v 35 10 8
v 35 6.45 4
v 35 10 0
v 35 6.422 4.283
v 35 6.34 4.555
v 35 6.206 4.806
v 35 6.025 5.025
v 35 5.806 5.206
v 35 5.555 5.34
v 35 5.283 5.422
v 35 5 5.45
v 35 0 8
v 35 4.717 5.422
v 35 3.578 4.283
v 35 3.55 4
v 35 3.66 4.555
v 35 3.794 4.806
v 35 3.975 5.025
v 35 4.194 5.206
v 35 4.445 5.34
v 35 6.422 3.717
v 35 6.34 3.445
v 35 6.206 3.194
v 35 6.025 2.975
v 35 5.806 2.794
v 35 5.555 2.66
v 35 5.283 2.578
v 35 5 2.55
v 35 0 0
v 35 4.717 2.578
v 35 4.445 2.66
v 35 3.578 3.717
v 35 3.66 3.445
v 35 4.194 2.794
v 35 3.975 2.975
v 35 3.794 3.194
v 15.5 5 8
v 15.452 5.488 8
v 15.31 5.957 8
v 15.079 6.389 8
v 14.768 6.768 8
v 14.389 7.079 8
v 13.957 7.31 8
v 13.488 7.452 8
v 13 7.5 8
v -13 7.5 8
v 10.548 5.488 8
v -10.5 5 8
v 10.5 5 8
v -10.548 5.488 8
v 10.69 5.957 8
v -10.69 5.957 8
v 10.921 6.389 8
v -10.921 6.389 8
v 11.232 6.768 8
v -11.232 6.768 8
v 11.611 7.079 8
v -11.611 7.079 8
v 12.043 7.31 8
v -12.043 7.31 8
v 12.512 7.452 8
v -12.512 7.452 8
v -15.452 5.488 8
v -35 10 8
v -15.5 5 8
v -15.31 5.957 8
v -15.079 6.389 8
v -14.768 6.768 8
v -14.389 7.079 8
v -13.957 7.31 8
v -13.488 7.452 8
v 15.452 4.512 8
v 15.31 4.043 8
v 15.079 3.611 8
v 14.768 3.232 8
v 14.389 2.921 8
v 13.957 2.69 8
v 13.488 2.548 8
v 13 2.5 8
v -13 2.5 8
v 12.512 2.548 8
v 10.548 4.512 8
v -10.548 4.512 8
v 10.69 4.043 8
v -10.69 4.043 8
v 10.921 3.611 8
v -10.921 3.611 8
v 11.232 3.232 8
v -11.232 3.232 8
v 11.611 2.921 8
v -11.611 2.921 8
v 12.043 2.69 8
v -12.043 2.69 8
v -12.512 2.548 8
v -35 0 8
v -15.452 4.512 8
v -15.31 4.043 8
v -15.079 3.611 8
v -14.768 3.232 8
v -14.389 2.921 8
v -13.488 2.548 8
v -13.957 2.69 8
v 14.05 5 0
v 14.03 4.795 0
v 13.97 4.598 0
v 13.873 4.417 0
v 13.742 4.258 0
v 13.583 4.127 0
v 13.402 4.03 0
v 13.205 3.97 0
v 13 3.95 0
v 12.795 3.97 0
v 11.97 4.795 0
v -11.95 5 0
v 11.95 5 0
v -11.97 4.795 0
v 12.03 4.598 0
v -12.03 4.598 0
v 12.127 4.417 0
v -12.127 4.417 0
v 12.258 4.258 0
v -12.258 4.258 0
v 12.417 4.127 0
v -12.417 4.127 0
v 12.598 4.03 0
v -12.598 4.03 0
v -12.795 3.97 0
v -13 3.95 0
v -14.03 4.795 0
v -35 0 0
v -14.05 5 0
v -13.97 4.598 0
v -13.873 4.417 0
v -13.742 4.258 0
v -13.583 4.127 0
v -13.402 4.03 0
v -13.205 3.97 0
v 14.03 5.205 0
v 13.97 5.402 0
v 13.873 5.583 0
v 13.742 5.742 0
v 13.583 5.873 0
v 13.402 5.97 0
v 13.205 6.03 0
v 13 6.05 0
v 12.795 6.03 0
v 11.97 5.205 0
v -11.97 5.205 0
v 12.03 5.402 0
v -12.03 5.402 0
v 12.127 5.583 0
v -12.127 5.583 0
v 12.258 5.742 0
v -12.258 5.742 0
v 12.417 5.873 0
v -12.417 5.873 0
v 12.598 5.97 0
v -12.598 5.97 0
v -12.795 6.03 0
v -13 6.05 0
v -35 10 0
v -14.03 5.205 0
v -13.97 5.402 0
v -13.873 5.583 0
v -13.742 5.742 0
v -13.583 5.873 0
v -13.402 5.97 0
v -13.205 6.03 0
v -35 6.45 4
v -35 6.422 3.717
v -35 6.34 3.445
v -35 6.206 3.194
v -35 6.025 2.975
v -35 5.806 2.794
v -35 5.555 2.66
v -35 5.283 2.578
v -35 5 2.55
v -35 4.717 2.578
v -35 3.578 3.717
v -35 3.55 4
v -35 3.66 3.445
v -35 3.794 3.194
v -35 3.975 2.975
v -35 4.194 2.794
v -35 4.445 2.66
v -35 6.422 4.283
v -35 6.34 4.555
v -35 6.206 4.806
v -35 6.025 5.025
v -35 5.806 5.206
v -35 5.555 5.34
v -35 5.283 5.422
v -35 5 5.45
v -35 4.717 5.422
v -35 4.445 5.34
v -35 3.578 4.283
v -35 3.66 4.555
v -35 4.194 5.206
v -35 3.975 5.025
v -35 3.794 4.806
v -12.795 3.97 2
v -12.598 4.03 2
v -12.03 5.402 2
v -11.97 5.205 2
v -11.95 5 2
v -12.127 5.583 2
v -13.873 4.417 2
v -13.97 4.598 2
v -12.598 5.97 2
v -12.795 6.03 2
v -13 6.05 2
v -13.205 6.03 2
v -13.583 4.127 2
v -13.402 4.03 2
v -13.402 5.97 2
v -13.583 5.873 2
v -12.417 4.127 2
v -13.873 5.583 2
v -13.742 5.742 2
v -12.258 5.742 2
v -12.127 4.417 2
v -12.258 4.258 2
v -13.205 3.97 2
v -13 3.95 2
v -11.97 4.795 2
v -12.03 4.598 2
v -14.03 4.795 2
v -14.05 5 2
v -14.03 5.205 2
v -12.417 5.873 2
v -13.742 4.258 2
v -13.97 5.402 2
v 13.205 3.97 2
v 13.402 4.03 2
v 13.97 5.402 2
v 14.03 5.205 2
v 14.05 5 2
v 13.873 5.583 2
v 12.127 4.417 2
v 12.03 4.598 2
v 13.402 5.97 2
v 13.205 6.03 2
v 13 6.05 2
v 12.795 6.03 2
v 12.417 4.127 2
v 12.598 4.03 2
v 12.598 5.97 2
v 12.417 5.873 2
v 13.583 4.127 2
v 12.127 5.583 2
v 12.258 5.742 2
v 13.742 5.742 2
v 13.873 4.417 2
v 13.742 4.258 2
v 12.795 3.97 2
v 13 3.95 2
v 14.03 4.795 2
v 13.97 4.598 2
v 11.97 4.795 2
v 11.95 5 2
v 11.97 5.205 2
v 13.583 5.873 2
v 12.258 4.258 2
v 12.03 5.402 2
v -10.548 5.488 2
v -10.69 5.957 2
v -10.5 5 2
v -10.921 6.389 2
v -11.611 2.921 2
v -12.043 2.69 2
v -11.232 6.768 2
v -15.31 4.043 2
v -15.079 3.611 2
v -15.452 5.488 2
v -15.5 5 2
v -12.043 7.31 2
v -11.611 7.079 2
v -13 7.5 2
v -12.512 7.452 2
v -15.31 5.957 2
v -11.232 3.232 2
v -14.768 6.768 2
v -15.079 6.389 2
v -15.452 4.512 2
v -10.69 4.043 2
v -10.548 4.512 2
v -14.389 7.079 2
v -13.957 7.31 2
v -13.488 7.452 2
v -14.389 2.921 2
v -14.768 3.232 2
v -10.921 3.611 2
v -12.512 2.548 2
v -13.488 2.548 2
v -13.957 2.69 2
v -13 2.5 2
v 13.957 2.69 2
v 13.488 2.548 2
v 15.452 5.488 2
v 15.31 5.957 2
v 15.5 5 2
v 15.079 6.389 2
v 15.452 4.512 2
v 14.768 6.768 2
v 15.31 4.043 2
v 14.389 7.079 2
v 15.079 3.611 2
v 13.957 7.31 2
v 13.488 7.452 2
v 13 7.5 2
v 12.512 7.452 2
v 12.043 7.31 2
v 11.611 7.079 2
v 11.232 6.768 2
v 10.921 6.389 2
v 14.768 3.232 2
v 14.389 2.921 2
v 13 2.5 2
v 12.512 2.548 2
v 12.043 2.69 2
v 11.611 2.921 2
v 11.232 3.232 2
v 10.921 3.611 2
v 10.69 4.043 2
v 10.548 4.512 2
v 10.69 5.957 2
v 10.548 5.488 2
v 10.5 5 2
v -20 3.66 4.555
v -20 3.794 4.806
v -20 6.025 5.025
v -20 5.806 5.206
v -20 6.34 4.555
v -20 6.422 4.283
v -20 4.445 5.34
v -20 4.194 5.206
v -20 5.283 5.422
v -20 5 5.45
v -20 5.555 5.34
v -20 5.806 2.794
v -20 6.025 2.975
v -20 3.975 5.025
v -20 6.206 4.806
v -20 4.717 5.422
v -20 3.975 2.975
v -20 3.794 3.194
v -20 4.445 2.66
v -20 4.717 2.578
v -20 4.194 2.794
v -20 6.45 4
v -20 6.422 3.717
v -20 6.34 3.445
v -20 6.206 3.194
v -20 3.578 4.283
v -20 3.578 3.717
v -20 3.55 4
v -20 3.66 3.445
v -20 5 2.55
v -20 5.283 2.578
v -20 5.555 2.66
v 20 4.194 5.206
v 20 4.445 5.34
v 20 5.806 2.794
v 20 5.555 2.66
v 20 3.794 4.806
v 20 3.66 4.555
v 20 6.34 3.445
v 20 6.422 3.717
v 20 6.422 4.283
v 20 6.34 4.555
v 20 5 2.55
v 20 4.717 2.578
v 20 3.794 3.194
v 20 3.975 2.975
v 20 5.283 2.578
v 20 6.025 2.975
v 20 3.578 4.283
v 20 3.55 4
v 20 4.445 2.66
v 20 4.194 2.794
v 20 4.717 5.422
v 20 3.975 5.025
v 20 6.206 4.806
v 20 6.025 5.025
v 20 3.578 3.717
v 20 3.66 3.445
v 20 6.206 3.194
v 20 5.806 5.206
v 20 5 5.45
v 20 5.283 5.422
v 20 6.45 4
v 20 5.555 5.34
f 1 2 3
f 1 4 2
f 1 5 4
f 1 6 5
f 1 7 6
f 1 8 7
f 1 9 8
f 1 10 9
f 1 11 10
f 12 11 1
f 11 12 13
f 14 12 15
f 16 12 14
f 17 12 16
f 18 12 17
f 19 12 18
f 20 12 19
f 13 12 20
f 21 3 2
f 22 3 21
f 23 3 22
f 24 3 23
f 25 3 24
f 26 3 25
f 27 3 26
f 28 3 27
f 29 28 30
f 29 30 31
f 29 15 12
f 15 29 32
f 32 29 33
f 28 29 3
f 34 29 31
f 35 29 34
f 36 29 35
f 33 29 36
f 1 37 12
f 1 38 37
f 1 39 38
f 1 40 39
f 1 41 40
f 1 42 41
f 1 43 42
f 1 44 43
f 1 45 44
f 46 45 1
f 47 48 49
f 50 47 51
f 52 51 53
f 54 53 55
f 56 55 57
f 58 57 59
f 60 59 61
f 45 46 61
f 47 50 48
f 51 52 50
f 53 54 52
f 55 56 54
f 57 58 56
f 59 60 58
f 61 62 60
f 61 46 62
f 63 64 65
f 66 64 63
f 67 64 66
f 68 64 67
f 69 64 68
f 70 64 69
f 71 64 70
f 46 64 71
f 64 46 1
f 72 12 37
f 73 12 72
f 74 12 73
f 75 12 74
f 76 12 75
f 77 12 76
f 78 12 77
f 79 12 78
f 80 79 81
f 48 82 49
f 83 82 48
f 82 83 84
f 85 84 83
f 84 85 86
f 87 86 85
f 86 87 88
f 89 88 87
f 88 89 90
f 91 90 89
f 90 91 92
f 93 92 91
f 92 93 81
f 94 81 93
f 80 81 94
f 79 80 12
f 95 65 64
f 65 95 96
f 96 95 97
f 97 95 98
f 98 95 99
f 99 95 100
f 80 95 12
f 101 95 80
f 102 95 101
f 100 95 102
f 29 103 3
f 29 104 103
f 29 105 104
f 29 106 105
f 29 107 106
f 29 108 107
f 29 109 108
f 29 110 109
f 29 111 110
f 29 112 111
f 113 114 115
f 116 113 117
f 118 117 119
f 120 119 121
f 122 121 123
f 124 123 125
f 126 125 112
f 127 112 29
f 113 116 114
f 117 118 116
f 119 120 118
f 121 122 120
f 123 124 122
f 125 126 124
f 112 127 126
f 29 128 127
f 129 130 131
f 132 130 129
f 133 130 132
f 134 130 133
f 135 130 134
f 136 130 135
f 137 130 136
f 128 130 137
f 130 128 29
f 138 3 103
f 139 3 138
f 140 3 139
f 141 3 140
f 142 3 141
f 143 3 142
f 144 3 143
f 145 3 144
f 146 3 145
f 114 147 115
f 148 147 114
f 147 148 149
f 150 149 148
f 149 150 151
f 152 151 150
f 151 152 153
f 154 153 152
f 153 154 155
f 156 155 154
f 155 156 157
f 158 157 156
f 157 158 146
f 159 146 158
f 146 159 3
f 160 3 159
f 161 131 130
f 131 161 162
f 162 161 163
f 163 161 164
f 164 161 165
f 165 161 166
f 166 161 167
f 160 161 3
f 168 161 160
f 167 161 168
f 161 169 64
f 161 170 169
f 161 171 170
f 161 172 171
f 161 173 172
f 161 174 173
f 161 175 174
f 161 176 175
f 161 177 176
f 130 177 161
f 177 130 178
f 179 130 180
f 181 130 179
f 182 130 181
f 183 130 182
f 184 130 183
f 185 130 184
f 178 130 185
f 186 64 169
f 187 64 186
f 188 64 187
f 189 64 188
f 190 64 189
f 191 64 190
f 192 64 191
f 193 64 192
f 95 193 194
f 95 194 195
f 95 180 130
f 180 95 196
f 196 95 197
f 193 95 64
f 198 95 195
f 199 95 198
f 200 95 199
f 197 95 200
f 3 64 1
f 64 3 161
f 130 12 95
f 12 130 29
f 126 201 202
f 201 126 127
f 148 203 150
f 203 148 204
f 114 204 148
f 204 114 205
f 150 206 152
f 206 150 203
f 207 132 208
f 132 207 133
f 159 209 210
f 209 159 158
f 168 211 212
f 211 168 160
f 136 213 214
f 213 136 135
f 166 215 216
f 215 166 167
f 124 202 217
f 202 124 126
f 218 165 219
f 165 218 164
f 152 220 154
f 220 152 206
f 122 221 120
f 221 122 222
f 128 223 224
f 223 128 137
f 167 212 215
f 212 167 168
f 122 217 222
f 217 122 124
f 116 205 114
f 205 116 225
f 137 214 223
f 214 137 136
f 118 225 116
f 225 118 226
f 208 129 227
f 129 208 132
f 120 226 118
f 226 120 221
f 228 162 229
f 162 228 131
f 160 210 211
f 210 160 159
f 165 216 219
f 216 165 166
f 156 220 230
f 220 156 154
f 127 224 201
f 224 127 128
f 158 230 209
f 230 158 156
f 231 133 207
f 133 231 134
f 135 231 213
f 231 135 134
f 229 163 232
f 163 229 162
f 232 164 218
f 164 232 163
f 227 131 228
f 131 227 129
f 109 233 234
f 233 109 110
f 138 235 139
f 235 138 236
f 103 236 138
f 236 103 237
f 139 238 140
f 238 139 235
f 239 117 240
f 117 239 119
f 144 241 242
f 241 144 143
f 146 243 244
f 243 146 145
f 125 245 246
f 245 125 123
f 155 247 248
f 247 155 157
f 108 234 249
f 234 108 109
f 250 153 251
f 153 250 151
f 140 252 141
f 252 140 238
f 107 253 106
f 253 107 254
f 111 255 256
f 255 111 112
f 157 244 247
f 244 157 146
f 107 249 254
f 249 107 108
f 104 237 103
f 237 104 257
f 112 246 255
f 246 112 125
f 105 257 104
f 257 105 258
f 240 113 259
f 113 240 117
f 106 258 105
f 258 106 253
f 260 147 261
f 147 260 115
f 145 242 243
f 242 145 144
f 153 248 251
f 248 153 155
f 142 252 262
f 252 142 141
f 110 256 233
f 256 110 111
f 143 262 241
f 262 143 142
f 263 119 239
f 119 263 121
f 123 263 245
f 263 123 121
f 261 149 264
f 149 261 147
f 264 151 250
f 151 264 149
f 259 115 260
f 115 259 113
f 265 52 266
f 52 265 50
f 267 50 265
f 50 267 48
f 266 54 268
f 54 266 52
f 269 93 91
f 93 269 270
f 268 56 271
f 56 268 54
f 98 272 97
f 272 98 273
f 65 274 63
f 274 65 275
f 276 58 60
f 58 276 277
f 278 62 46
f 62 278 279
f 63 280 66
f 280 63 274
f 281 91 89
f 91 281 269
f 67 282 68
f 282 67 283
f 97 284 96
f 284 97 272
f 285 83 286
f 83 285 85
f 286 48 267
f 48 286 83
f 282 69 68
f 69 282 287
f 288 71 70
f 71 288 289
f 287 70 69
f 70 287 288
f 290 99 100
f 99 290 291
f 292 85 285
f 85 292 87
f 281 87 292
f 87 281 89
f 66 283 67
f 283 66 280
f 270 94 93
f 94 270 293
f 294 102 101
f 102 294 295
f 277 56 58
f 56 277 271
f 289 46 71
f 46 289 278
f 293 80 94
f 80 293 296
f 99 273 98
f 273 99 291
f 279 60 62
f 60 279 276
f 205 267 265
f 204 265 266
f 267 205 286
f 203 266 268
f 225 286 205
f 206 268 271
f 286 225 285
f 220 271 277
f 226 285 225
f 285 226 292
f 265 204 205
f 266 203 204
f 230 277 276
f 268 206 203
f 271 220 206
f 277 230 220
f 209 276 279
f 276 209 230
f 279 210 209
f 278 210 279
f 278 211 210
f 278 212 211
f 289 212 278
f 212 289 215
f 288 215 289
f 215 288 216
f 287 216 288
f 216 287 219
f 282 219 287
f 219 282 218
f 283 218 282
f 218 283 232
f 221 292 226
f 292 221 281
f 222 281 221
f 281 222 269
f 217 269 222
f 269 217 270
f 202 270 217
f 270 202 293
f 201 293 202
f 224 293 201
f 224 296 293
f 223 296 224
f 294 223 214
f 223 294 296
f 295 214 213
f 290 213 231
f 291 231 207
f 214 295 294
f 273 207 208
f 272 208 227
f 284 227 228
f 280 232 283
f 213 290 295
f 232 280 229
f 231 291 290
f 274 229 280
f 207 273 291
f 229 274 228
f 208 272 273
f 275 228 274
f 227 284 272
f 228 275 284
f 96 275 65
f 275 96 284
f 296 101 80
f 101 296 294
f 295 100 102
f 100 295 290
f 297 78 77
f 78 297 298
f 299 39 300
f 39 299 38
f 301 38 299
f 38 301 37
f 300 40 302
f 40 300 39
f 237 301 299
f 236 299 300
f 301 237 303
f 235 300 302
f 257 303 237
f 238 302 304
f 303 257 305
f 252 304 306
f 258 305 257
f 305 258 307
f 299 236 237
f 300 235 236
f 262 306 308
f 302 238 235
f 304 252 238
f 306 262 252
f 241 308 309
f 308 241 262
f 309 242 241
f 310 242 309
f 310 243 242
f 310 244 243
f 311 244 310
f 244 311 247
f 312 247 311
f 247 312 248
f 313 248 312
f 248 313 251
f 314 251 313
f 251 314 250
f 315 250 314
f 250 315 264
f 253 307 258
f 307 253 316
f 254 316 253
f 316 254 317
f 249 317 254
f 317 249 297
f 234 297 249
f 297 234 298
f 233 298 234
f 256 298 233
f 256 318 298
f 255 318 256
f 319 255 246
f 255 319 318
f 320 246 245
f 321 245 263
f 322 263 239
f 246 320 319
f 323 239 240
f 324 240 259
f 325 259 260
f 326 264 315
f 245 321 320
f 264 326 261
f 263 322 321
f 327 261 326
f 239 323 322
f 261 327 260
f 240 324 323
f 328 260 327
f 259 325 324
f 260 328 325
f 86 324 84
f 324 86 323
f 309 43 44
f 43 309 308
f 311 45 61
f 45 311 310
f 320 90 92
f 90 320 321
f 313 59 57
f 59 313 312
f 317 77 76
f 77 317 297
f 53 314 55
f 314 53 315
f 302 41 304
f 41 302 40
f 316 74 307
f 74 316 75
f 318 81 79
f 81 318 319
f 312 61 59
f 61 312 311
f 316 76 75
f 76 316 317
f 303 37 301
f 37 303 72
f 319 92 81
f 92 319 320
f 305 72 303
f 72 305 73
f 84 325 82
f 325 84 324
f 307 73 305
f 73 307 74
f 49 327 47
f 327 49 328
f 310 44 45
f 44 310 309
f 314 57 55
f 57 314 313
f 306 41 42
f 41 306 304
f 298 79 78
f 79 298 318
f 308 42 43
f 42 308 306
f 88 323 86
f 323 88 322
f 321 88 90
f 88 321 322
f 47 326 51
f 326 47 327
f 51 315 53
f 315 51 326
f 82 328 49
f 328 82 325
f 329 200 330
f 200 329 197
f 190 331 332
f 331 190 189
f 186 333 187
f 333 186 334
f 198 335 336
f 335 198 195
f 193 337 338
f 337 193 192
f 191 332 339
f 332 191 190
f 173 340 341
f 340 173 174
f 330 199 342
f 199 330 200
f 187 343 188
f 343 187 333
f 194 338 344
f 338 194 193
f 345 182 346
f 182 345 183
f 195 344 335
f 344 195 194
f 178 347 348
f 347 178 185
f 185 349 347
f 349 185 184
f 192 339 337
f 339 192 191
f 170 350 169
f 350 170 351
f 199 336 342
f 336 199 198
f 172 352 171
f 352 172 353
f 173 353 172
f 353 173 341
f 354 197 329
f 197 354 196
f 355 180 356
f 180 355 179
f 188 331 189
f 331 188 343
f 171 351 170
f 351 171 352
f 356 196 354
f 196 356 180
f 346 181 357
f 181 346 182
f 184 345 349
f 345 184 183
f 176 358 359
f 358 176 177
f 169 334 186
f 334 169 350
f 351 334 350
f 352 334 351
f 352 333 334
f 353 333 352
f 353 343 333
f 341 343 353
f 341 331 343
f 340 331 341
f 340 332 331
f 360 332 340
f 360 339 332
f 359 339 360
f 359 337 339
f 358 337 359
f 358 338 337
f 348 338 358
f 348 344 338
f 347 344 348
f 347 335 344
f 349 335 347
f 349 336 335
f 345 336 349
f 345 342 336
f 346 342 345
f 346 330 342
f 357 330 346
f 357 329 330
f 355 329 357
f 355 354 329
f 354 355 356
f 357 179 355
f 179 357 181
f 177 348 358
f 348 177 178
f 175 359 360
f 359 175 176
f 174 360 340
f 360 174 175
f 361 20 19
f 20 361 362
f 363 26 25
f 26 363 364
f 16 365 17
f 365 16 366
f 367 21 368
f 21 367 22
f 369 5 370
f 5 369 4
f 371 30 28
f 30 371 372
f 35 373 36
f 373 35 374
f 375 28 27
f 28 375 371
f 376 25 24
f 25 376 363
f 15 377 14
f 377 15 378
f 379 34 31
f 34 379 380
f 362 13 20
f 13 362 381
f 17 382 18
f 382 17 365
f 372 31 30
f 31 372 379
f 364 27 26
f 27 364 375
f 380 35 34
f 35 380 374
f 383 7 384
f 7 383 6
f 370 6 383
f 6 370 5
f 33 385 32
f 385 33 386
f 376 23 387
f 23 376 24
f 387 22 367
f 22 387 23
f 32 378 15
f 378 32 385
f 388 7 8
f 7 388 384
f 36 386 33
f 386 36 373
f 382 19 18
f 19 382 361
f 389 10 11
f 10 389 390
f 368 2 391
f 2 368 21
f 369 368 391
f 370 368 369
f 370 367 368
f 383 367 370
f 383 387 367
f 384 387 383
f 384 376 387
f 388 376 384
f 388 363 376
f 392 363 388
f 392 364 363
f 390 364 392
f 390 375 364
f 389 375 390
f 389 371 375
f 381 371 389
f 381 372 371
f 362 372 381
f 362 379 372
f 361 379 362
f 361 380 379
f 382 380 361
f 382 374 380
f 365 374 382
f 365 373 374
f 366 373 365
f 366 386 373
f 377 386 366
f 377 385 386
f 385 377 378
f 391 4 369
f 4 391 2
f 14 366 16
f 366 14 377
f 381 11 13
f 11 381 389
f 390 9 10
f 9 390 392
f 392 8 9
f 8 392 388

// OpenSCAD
screw_dist = 26;
frame_w = 70;

screw_d = 2.1;

$fn=32;


difference() {
    union() {
        translate([-frame_w/2,0,0]) cube([frame_w, 10, 8]);
        
    }
    
    translate([-screw_dist/2,5,0]) cylinder(d=screw_d, h=10);
    translate([screw_dist/2,5,0]) cylinder(d=screw_d, h=10);
    
    translate([-screw_dist/2,5,2]) cylinder(d=5, h=10);
    translate([screw_dist/2,5,2]) cylinder(d=5, h=10);
    
    translate([-frame_w/2+15,5,4]) rotate([0,-90,0]) cylinder(d=2.9, h=100);
    translate([frame_w/2-15,5,4]) rotate([0,90,0]) cylinder(d=2.9, h=100);
}
